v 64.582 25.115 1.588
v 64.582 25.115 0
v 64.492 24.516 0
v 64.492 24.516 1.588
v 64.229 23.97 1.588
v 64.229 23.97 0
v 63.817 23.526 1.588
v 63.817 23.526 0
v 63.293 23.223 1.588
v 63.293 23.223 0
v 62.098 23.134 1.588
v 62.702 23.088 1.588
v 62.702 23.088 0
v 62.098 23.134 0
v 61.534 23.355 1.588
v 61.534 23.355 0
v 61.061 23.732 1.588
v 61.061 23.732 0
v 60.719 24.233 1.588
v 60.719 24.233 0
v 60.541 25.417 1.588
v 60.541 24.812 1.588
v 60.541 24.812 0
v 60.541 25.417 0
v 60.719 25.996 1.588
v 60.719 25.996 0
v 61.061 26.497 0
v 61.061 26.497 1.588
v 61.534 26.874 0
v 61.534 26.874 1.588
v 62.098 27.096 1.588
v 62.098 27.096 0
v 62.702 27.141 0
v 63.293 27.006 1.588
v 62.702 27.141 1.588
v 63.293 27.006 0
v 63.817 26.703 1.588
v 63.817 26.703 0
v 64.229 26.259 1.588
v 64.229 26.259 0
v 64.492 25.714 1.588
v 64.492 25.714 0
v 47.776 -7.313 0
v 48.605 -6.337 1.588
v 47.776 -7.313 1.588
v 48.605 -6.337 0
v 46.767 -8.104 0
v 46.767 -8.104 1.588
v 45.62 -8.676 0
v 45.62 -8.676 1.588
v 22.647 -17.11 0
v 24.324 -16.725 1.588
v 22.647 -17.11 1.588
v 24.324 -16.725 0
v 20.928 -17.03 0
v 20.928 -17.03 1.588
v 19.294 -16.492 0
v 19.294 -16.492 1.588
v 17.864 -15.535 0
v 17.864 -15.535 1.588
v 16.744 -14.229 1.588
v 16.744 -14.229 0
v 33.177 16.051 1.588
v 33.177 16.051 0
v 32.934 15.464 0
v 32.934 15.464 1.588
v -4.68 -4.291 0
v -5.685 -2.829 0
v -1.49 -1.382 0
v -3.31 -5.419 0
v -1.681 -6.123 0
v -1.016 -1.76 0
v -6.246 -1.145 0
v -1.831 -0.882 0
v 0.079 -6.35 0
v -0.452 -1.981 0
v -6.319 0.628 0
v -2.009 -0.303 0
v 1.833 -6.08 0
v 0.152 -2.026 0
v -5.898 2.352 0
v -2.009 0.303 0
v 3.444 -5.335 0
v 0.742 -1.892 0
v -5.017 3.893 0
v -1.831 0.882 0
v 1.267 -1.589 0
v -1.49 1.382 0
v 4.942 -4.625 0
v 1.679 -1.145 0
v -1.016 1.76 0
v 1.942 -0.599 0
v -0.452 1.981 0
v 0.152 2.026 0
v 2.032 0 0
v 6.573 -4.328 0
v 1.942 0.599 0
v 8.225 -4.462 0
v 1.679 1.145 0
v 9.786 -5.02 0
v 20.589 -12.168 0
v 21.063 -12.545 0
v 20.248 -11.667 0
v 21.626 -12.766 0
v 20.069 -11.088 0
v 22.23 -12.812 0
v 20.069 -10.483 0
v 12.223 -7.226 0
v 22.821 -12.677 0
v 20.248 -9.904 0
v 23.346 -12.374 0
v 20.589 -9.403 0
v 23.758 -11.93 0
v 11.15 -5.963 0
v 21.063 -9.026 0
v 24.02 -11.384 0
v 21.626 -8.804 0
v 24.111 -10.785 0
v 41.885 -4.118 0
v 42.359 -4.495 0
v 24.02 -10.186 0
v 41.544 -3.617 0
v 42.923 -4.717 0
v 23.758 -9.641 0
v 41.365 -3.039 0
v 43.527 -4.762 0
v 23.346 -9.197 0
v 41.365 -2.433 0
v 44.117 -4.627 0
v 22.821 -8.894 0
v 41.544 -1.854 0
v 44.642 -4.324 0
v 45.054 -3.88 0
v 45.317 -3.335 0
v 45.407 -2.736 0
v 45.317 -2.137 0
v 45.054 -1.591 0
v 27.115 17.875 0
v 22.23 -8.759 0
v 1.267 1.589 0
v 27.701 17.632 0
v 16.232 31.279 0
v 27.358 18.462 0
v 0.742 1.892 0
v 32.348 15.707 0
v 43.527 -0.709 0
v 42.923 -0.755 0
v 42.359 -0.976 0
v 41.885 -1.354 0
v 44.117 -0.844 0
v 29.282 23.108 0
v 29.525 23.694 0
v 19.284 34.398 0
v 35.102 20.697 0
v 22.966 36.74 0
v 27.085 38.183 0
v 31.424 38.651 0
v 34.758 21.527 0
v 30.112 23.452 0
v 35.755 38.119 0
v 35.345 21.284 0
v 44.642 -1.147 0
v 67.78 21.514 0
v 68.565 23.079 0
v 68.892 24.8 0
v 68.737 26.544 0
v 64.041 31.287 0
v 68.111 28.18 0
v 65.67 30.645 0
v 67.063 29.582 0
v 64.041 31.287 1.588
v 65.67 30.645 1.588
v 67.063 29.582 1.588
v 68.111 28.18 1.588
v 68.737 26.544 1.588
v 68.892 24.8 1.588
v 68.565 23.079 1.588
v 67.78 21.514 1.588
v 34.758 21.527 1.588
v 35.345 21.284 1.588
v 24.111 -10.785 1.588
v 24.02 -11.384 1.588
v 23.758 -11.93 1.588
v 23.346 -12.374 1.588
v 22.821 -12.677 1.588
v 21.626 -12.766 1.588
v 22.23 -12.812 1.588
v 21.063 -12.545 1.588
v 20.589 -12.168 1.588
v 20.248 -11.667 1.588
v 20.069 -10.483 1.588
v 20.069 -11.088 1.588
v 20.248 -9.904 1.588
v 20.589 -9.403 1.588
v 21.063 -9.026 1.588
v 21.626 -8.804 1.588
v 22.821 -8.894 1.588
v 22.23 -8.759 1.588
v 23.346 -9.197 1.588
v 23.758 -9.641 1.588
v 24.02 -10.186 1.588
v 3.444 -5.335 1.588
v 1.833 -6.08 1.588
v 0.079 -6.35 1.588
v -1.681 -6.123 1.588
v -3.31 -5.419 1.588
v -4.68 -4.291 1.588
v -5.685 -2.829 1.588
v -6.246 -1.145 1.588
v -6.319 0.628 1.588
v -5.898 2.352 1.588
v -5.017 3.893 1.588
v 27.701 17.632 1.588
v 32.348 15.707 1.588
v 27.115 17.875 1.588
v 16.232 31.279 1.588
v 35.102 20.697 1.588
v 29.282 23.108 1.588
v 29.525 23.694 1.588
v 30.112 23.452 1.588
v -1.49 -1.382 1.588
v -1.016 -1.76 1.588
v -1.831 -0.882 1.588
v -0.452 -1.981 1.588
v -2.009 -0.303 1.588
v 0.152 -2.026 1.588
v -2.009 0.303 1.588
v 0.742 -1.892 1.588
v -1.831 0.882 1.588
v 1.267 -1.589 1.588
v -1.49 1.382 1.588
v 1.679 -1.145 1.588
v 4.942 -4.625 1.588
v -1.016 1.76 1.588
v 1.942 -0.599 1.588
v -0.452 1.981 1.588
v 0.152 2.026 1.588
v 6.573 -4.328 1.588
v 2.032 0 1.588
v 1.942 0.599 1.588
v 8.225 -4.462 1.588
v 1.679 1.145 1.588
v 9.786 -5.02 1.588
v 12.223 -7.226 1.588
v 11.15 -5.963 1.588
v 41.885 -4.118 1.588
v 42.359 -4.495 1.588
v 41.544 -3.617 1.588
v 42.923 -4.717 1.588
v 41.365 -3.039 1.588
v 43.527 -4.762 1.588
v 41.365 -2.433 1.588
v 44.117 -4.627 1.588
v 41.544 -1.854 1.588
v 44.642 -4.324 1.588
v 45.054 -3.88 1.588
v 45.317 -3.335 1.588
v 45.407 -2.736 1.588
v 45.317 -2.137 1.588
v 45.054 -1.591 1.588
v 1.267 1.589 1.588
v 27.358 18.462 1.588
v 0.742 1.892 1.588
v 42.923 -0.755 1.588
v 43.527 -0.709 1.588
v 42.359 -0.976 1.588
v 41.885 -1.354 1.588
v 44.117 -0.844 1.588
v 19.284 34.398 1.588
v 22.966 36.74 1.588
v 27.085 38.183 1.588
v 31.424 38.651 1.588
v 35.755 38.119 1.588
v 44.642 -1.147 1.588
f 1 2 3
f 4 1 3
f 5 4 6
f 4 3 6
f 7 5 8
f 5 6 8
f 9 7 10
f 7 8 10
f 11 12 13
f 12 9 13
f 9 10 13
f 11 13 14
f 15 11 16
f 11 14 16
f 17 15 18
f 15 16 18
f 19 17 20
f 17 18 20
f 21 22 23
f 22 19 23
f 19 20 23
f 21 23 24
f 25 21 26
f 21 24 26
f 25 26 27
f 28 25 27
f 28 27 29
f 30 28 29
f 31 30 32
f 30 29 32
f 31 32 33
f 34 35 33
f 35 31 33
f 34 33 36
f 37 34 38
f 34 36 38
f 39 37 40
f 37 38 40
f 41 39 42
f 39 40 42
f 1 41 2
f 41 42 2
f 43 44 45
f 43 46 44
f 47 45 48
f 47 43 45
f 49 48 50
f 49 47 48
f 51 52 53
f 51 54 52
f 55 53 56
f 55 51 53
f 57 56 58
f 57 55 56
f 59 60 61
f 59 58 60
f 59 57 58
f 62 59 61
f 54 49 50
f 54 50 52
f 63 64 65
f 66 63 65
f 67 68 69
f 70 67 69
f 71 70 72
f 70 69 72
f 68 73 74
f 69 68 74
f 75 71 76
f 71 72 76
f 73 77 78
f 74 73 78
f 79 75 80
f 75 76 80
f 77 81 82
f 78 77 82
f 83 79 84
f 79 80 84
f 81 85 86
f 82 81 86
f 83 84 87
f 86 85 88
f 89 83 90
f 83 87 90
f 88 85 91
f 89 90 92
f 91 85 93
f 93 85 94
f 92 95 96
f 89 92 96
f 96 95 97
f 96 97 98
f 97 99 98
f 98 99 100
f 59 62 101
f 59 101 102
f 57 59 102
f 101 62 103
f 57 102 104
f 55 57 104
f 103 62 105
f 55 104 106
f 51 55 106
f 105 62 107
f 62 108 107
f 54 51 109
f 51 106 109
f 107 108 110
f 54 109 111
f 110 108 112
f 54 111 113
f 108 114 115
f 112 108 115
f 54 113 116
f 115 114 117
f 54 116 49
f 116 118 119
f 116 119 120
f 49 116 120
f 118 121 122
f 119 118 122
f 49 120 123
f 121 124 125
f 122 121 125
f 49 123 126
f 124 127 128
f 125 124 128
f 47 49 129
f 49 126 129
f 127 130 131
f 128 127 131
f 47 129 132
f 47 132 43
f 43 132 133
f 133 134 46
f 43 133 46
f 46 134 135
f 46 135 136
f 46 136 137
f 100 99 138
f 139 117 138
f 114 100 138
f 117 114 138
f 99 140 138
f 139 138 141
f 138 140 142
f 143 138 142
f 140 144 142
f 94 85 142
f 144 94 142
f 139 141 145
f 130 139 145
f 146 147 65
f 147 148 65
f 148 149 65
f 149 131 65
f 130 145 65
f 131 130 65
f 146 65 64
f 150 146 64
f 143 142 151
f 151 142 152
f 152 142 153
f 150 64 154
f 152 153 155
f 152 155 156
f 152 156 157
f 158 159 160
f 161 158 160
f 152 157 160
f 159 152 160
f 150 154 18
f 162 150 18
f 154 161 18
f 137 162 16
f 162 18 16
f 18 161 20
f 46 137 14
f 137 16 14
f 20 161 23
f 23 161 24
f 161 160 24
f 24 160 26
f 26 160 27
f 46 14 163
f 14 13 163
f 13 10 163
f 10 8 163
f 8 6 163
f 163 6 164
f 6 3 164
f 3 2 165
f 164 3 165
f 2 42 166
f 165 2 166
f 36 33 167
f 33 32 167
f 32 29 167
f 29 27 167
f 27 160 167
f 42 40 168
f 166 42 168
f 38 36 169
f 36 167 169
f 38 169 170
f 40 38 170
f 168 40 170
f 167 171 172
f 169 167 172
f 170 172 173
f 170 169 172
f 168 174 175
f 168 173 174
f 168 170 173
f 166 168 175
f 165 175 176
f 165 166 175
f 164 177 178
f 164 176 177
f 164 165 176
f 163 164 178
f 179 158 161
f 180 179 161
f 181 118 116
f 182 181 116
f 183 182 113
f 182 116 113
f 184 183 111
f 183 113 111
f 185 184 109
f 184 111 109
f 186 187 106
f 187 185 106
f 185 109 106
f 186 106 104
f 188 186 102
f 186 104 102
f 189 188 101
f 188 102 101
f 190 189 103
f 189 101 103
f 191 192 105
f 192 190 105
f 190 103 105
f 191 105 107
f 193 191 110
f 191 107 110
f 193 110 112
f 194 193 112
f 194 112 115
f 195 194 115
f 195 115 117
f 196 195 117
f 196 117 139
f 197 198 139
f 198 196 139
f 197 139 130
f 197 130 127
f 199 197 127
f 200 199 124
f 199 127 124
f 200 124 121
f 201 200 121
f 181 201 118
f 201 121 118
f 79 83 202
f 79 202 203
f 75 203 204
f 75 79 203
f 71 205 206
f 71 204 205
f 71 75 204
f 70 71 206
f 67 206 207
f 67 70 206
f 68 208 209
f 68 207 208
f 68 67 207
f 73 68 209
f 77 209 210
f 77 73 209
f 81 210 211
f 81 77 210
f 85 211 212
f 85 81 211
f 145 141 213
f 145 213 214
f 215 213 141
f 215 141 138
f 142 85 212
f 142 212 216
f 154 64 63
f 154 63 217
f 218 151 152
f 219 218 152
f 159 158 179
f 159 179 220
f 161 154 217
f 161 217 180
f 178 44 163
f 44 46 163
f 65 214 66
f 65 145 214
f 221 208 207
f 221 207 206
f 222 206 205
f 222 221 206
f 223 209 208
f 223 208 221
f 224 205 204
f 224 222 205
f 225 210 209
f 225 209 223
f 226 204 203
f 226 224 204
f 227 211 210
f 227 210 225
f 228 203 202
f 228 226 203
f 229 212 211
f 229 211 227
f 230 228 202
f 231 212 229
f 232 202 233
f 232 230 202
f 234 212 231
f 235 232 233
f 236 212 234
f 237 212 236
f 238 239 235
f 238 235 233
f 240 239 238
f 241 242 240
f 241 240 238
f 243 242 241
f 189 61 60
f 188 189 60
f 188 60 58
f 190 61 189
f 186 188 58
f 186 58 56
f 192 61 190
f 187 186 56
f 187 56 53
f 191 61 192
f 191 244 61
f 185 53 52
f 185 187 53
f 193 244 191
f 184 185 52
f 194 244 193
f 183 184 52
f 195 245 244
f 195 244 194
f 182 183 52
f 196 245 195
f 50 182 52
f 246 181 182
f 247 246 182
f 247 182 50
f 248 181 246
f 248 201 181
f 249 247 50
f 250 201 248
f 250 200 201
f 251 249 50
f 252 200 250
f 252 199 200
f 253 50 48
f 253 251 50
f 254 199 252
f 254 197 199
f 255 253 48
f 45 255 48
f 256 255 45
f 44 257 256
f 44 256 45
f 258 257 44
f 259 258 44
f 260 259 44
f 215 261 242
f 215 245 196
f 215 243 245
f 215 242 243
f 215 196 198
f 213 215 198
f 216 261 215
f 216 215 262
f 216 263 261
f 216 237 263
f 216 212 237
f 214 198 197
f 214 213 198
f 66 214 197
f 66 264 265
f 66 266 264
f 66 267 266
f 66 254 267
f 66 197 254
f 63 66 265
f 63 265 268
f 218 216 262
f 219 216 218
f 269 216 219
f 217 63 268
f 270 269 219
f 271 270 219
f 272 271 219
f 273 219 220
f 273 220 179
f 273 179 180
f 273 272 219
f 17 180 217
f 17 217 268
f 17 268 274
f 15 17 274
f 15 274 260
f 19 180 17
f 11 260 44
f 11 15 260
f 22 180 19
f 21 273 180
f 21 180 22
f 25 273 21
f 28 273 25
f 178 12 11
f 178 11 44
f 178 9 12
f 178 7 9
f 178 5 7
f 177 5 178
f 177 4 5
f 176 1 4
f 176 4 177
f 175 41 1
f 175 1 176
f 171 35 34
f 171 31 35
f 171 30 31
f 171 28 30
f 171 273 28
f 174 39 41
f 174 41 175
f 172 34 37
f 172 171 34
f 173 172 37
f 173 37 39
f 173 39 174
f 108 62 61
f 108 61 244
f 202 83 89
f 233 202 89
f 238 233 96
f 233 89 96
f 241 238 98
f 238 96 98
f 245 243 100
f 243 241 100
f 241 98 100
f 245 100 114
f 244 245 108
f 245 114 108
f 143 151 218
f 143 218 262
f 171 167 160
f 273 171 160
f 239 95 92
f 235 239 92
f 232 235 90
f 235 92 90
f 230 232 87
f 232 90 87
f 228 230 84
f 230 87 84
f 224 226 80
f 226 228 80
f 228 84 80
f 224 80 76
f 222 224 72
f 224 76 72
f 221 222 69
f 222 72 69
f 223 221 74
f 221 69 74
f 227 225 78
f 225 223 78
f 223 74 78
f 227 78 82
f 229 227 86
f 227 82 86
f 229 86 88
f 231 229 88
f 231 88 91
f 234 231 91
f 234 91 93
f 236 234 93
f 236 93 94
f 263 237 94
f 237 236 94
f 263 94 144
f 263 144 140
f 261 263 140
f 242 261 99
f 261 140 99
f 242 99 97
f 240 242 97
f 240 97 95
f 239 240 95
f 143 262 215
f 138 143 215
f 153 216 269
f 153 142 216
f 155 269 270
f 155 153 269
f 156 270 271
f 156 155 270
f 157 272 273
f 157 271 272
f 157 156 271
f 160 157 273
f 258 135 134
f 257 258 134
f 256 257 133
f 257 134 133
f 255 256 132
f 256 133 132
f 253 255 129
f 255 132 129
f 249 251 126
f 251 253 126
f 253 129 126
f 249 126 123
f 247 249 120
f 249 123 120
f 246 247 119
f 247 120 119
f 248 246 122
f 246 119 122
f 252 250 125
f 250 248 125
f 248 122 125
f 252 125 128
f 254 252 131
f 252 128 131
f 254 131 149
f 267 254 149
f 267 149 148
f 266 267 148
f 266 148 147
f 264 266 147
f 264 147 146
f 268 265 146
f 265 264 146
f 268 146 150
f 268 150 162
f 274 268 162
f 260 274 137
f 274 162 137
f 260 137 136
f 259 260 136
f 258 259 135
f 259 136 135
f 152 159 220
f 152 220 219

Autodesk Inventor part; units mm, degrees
ref_plane "YZ Plane" through (0, 0, 0) normal (1, 0, 0) x (0, 1, 0)
ref_plane "XZ Plane" through (0, 0, 0) normal (0, 1, 0) x (-1, 0, 0)
ref_plane "XY Plane" through (0, 0, 0) normal (0, 0, 1) x (1, 0, 0)
sketch "Sketch1" plane through (0, 0, 0) normal (0, 0, 1) x (1, 0, 0)
  circle A0 centre (0, 0) radius 2.0955 construction
  circle A1 centre (31.2825, 19.6012) radius 7.2 construction
  circle A2 centre (43.3748, -2.7357) radius 2.15 construction
  circle A3 centre (31.2825, 19.6012) radius 31.75 construction
  circle A4 centre (43.3748, -2.7357) radius 2.032
  line L0 (31.2825, 19.6012) -> (31.2825, -12.1488) construction
  circle A5 centre (31.2825, -12.1488) radius 2.032 construction
  line L1 (31.2825, 19.6012) -> (62.5502, 25.1146) construction
  line L2 (31.2825, 19.6012) -> (63.0325, 19.6012) construction
  circle A6 centre (62.5502, 25.1146) radius 2.032
  arc A7 (67.7804, 21.5135) -> (64.041, 31.2871) centre (62.5502, 25.1146) ccw
  circle A8 centre (0, 0) radius 2.032
  arc A9 (-5.017, 3.8926) -> (3.4439, -5.335) centre (0, 0) ccw
  arc A10 (45.62, -8.6755) -> (48.605, -6.3367) centre (43.3748, -2.7357) ccw
  circle A11 centre (22.0786, -10.7854) radius 2.032
  line L3 (48.605, -6.3367) -> (67.7804, 21.5135)
  arc A12 (35.755, 38.1188) -> (16.2316, 31.279) centre (31.2825, 19.6012) ccw
  line L4 (64.041, 31.2871) -> (35.755, 38.1188)
  line L5 (-5.017, 3.8926) -> (16.2316, 31.279)
  arc A13 (16.7437, -14.2294) -> (24.3239, -16.7253) centre (22.0786, -10.7854) ccw
  arc A14 (12.2228, -7.226) -> (3.4439, -5.335) centre (6.8878, -10.67) ccw
  line L6 (16.7437, -14.2294) -> (12.2228, -7.226)
  line L7 (45.9985, -8.5324) -> (24.3239, -16.7253)
  line L8 (27.7013, 17.6318) -> (32.3477, 15.7072)
  line L9 (27.7013, 17.6318) -> (27.7013, 17.6318)
  line L10 (32.3477, 15.7072) -> (27.7013, 17.6318)
  line L11 (32.3477, 15.7072) -> (32.3477, 15.7072)
  line L12 (33.1773, 16.0509) -> (35.1019, 20.6973)
  line L13 (33.1773, 16.0509) -> (33.1773, 16.0509)
  line L14 (35.1019, 20.6973) -> (33.1773, 16.0509)
  line L15 (35.1019, 20.6973) -> (35.1019, 20.6973)
  line L16 (34.7583, 21.5269) -> (30.1119, 23.4515)
  line L17 (34.7583, 21.5269) -> (34.7583, 21.5269)
  line L18 (30.1119, 23.4515) -> (34.7583, 21.5269)
  line L19 (30.1119, 23.4515) -> (30.1119, 23.4515)
  line L20 (29.2822, 23.1079) -> (27.3576, 18.4615)
  line L21 (29.2822, 23.1079) -> (29.2822, 23.1079)
  line L22 (27.3576, 18.4615) -> (29.2822, 23.1079)
  line L23 (27.3576, 18.4615) -> (27.3576, 18.4615)
  line L24 (35.1019, 20.6973) -> (35.3449, 21.2839)
  line L25 (34.7583, 21.5269) -> (35.3449, 21.2839)
  line L26 (33.1773, 16.0509) -> (32.9343, 15.4642)
  line L27 (32.3477, 15.7072) -> (32.9343, 15.4642)
  line L28 (29.2822, 23.1079) -> (29.5252, 23.6945)
  line L29 (30.1119, 23.4515) -> (29.5252, 23.6945)
  line L30 (27.3576, 18.4615) -> (27.1146, 17.8748)
  line L31 (27.7013, 17.6318) -> (27.1146, 17.8748)
  point P0 (0, 0)
extrude "Plate1" add sketch "Sketch1" along normal blind 1.5875
sketch "Sketch2" plane through (0, 0, 1.5875) normal (0, 0, 1) x (1, 0, 0)
  arc A0 (35.755, 38.1188) -> (16.2316, 31.279) centre (31.2825, 19.6012) ccw projected
  line L0 (35.755, 38.1188) -> (64.041, 31.2871) projected
  arc A1 (67.7804, 21.5135) -> (64.041, 31.2871) centre (62.5502, 25.1146) ccw projected
  line L1 (67.7804, 21.5135) -> (48.605, -6.3367) projected
  arc A2 (45.62, -8.6755) -> (48.605, -6.3367) centre (43.3748, -2.7357) ccw projected
  line L2 (45.62, -8.6755) -> (24.3239, -16.7253) projected
  arc A3 (16.7437, -14.2294) -> (24.3239, -16.7253) centre (22.0786, -10.7854) ccw projected
  line L3 (16.7437, -14.2294) -> (12.2228, -7.226) projected
  arc A4 (12.2228, -7.226) -> (3.4439, -5.335) centre (6.8878, -10.67) ccw projected
  arc A5 (-5.017, 3.8926) -> (3.4439, -5.335) centre (0, 0) ccw projected
  line L4 (-5.017, 3.8926) -> (16.2316, 31.279) projected
  circle A6 centre (0, 0) radius 2.032 projected
  circle A7 centre (22.0786, -10.7854) radius 2.032 projected
  circle A8 centre (43.3748, -2.7357) radius 2.032 projected
  circle A9 centre (62.5502, 25.1146) radius 2.032 projected
  line L5 (29.5252, 23.6945) -> (35.3449, 21.2839) projected
  line L6 (27.1146, 17.8748) -> (29.5252, 23.6945) projected
  line L7 (32.9343, 15.4642) -> (27.1146, 17.8748) projected
  line L8 (35.3449, 21.2839) -> (32.9343, 15.4642) projected
  point P0 (0, 0)
equation "\"d20\" = Thickness"
equation "\"BendRadius\" = Thickness"
equation "\"BendReliefWidth\" = Thickness"
equation "\"BendReliefDepth\" = 0.5 * Thickness"
equation "\"CornerReliefSize\" = 4 * Thickness"
equation "\"MinimumRemnant\" = 2 * Thickness"
equation "\"TransitionRadius\" = BendRadius"
equation "\"JacobiRadiusSize\" = BendRadius"
equation "\"GapSize\" = Thickness"
equation "\"Thickness\" = 1.5875"
properties part number "Rear Vertical Odom Pod" material "Acetal Resin, White"
